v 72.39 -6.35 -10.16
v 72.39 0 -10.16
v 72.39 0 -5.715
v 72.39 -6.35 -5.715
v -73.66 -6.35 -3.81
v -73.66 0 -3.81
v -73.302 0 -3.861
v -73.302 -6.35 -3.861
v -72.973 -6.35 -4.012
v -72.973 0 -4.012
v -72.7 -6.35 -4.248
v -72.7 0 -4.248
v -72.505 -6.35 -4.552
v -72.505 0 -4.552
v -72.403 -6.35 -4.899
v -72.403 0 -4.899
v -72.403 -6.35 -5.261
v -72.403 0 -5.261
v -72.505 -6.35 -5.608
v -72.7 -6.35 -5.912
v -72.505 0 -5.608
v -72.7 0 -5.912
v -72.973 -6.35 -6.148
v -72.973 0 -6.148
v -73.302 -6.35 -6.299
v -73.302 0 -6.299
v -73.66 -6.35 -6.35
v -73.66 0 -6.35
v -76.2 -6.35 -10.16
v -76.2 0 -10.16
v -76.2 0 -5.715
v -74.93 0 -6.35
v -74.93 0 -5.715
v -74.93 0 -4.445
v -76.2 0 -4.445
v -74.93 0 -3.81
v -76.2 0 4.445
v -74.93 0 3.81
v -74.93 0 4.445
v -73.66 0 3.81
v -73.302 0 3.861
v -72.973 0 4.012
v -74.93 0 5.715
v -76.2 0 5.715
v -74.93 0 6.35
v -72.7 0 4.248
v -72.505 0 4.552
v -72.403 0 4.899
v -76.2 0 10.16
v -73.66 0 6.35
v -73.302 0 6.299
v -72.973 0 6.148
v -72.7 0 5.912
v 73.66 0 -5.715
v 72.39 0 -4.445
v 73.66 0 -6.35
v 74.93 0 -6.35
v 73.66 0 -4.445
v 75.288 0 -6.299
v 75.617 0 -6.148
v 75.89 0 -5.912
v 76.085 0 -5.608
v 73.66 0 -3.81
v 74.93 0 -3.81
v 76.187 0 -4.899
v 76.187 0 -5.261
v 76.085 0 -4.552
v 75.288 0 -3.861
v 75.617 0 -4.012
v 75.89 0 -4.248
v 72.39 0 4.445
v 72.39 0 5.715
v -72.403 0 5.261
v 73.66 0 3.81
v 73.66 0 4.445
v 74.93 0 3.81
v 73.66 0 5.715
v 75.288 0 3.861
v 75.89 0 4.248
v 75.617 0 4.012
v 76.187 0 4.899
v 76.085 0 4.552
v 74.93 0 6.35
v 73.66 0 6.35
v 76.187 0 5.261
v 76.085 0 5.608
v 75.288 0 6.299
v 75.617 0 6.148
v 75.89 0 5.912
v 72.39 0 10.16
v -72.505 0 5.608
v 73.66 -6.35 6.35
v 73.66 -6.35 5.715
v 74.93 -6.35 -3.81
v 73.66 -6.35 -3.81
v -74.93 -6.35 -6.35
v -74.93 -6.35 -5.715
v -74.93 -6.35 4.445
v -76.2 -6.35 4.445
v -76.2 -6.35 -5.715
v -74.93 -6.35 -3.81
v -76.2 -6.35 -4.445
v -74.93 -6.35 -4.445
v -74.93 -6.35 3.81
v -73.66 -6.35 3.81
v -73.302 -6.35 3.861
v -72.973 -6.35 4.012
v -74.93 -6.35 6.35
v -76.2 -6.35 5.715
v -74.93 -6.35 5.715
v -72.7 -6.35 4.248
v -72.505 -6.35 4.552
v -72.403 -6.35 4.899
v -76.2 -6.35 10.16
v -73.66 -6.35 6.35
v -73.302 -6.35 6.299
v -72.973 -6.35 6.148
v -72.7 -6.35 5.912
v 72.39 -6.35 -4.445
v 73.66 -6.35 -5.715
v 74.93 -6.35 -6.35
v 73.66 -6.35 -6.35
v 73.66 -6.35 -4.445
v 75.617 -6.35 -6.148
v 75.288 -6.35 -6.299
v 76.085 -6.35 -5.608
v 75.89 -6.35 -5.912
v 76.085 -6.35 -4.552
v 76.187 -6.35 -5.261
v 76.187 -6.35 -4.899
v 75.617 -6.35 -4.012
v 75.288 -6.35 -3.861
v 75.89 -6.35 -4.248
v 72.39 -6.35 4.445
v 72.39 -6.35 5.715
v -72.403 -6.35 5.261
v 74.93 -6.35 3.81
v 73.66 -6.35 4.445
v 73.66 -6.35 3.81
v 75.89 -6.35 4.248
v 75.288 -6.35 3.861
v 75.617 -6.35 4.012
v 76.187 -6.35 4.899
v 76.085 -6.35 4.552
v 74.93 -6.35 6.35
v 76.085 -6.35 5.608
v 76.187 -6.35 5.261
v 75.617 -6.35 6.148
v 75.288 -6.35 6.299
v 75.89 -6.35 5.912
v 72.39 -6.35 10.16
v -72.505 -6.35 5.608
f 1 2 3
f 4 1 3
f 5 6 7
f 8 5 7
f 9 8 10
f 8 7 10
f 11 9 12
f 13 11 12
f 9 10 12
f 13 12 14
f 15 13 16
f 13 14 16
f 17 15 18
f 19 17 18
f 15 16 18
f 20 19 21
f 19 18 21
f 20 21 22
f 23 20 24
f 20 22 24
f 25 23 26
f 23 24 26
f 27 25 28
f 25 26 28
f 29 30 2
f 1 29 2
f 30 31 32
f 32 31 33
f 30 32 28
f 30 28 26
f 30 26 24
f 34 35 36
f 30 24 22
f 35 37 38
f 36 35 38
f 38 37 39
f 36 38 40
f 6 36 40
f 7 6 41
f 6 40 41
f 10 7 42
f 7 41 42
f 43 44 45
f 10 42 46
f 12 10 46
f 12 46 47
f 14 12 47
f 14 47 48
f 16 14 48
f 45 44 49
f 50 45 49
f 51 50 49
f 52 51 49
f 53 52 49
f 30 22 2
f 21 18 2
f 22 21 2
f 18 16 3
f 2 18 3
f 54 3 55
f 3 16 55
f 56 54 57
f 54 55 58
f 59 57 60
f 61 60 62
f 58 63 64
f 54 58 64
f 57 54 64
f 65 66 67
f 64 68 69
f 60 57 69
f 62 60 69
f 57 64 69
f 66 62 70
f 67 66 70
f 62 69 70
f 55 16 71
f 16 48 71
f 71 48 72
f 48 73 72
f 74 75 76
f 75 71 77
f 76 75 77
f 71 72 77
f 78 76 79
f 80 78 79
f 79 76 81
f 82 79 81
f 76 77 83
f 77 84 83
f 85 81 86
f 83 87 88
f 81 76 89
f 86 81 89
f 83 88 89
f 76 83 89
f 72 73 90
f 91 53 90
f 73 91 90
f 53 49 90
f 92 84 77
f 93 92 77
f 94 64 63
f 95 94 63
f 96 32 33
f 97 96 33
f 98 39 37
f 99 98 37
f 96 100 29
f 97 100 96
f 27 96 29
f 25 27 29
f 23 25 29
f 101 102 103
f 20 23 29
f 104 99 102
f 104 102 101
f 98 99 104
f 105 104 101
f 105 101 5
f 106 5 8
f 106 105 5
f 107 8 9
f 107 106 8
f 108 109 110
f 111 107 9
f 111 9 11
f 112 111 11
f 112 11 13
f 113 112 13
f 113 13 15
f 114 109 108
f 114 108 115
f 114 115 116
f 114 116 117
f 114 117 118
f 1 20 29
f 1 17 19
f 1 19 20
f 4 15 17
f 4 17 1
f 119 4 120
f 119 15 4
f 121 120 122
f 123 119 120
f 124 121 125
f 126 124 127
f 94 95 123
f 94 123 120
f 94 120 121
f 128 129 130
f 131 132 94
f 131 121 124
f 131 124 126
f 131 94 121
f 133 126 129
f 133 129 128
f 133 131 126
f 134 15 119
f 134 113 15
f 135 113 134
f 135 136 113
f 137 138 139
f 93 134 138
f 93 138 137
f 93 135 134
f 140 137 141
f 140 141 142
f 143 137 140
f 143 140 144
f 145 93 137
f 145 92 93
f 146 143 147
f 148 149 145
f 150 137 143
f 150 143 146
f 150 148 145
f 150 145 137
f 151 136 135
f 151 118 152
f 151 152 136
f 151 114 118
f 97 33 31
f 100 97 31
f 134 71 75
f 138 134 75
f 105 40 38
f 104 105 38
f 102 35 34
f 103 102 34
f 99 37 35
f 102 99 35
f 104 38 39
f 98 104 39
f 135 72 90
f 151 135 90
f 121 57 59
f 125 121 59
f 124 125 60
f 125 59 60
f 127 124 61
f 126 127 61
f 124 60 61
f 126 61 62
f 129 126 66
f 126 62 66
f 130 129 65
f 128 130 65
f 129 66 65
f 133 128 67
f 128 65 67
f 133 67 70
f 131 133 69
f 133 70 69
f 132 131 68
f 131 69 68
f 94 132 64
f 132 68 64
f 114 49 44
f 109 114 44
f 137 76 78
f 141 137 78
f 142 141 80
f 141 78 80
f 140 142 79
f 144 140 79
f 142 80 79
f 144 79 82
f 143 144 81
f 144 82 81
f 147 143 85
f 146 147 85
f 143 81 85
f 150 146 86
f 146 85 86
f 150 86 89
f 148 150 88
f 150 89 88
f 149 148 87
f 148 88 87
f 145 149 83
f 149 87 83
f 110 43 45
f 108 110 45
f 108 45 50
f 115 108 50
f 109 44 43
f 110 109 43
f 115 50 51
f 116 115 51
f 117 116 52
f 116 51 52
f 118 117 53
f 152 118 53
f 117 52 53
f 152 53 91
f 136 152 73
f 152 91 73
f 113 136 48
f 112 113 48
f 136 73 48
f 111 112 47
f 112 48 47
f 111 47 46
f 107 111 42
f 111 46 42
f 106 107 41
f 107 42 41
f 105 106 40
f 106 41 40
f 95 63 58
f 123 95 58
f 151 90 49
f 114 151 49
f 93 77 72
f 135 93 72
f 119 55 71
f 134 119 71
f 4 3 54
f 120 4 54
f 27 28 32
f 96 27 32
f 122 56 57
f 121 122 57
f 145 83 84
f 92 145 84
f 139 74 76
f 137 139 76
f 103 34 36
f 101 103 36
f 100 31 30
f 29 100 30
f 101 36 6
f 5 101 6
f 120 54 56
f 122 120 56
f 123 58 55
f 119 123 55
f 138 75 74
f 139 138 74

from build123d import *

# Parameters (mm, degrees)
F1_DEPTH = 6.35


with BuildPart() as f1:
    # F0 (on Front) → F1 (new body)
    with BuildSketch(Plane.XZ):
        with BuildLine():
            Line((-76.2, -10.16), (72.39, -10.16))
            Line((72.39, -10.16), (72.39, -5.715))
            Line((72.39, -5.715), (73.66, -5.715))
            Line((73.66, -5.715), (73.66, -6.35))
            Line((73.66, -6.35), (74.93, -6.35))
            ThreePointArc((74.93, -6.35), (76.2, -5.08), (74.93, -3.81))
            Line((74.93, -3.81), (73.66, -3.81))
            Line((73.66, -3.81), (73.66, -4.445))
            Line((73.66, -4.445), (72.39, -4.445))
            Line((72.39, -4.445), (72.39, 4.445))
            Line((72.39, 4.445), (73.66, 4.445))
            Line((73.66, 4.445), (73.66, 3.81))
            Line((73.66, 3.81), (74.93, 3.81))
            ThreePointArc((74.93, 3.81), (76.2, 5.08), (74.93, 6.35))
            Line((74.93, 6.35), (73.66, 6.35))
            Line((73.66, 6.35), (73.66, 5.715))
            Line((73.66, 5.715), (72.39, 5.715))
            Line((72.39, 5.715), (72.39, 10.16))
            Line((72.39, 10.16), (-76.2, 10.16))
            Line((-76.2, 10.16), (-76.2, 5.715))
            Line((-76.2, 5.715), (-74.93, 5.715))
            Line((-74.93, 5.715), (-74.93, 6.35))
            Line((-74.93, 6.35), (-73.66, 6.35))
            ThreePointArc((-73.66, 6.35), (-72.39, 5.08), (-73.66, 3.81))
            Line((-73.66, 3.81), (-74.93, 3.81))
            Line((-74.93, 3.81), (-74.93, 4.445))
            Line((-74.93, 4.445), (-76.2, 4.445))
            Line((-76.2, 4.445), (-76.2, -4.445))
            Line((-76.2, -4.445), (-74.93, -4.445))
            Line((-74.93, -4.445), (-74.93, -3.81))
            Line((-74.93, -3.81), (-73.66, -3.81))
            ThreePointArc((-73.66, -3.81), (-72.39, -5.08), (-73.66, -6.35))
            Line((-73.66, -6.35), (-74.93, -6.35))
            Line((-74.93, -6.35), (-74.93, -5.715))
            Line((-74.93, -5.715), (-76.2, -5.715))
            Line((-76.2, -5.715), (-76.2, -10.16))
        make_face()
    extrude(amount=F1_DEPTH)


solid = f1.part
